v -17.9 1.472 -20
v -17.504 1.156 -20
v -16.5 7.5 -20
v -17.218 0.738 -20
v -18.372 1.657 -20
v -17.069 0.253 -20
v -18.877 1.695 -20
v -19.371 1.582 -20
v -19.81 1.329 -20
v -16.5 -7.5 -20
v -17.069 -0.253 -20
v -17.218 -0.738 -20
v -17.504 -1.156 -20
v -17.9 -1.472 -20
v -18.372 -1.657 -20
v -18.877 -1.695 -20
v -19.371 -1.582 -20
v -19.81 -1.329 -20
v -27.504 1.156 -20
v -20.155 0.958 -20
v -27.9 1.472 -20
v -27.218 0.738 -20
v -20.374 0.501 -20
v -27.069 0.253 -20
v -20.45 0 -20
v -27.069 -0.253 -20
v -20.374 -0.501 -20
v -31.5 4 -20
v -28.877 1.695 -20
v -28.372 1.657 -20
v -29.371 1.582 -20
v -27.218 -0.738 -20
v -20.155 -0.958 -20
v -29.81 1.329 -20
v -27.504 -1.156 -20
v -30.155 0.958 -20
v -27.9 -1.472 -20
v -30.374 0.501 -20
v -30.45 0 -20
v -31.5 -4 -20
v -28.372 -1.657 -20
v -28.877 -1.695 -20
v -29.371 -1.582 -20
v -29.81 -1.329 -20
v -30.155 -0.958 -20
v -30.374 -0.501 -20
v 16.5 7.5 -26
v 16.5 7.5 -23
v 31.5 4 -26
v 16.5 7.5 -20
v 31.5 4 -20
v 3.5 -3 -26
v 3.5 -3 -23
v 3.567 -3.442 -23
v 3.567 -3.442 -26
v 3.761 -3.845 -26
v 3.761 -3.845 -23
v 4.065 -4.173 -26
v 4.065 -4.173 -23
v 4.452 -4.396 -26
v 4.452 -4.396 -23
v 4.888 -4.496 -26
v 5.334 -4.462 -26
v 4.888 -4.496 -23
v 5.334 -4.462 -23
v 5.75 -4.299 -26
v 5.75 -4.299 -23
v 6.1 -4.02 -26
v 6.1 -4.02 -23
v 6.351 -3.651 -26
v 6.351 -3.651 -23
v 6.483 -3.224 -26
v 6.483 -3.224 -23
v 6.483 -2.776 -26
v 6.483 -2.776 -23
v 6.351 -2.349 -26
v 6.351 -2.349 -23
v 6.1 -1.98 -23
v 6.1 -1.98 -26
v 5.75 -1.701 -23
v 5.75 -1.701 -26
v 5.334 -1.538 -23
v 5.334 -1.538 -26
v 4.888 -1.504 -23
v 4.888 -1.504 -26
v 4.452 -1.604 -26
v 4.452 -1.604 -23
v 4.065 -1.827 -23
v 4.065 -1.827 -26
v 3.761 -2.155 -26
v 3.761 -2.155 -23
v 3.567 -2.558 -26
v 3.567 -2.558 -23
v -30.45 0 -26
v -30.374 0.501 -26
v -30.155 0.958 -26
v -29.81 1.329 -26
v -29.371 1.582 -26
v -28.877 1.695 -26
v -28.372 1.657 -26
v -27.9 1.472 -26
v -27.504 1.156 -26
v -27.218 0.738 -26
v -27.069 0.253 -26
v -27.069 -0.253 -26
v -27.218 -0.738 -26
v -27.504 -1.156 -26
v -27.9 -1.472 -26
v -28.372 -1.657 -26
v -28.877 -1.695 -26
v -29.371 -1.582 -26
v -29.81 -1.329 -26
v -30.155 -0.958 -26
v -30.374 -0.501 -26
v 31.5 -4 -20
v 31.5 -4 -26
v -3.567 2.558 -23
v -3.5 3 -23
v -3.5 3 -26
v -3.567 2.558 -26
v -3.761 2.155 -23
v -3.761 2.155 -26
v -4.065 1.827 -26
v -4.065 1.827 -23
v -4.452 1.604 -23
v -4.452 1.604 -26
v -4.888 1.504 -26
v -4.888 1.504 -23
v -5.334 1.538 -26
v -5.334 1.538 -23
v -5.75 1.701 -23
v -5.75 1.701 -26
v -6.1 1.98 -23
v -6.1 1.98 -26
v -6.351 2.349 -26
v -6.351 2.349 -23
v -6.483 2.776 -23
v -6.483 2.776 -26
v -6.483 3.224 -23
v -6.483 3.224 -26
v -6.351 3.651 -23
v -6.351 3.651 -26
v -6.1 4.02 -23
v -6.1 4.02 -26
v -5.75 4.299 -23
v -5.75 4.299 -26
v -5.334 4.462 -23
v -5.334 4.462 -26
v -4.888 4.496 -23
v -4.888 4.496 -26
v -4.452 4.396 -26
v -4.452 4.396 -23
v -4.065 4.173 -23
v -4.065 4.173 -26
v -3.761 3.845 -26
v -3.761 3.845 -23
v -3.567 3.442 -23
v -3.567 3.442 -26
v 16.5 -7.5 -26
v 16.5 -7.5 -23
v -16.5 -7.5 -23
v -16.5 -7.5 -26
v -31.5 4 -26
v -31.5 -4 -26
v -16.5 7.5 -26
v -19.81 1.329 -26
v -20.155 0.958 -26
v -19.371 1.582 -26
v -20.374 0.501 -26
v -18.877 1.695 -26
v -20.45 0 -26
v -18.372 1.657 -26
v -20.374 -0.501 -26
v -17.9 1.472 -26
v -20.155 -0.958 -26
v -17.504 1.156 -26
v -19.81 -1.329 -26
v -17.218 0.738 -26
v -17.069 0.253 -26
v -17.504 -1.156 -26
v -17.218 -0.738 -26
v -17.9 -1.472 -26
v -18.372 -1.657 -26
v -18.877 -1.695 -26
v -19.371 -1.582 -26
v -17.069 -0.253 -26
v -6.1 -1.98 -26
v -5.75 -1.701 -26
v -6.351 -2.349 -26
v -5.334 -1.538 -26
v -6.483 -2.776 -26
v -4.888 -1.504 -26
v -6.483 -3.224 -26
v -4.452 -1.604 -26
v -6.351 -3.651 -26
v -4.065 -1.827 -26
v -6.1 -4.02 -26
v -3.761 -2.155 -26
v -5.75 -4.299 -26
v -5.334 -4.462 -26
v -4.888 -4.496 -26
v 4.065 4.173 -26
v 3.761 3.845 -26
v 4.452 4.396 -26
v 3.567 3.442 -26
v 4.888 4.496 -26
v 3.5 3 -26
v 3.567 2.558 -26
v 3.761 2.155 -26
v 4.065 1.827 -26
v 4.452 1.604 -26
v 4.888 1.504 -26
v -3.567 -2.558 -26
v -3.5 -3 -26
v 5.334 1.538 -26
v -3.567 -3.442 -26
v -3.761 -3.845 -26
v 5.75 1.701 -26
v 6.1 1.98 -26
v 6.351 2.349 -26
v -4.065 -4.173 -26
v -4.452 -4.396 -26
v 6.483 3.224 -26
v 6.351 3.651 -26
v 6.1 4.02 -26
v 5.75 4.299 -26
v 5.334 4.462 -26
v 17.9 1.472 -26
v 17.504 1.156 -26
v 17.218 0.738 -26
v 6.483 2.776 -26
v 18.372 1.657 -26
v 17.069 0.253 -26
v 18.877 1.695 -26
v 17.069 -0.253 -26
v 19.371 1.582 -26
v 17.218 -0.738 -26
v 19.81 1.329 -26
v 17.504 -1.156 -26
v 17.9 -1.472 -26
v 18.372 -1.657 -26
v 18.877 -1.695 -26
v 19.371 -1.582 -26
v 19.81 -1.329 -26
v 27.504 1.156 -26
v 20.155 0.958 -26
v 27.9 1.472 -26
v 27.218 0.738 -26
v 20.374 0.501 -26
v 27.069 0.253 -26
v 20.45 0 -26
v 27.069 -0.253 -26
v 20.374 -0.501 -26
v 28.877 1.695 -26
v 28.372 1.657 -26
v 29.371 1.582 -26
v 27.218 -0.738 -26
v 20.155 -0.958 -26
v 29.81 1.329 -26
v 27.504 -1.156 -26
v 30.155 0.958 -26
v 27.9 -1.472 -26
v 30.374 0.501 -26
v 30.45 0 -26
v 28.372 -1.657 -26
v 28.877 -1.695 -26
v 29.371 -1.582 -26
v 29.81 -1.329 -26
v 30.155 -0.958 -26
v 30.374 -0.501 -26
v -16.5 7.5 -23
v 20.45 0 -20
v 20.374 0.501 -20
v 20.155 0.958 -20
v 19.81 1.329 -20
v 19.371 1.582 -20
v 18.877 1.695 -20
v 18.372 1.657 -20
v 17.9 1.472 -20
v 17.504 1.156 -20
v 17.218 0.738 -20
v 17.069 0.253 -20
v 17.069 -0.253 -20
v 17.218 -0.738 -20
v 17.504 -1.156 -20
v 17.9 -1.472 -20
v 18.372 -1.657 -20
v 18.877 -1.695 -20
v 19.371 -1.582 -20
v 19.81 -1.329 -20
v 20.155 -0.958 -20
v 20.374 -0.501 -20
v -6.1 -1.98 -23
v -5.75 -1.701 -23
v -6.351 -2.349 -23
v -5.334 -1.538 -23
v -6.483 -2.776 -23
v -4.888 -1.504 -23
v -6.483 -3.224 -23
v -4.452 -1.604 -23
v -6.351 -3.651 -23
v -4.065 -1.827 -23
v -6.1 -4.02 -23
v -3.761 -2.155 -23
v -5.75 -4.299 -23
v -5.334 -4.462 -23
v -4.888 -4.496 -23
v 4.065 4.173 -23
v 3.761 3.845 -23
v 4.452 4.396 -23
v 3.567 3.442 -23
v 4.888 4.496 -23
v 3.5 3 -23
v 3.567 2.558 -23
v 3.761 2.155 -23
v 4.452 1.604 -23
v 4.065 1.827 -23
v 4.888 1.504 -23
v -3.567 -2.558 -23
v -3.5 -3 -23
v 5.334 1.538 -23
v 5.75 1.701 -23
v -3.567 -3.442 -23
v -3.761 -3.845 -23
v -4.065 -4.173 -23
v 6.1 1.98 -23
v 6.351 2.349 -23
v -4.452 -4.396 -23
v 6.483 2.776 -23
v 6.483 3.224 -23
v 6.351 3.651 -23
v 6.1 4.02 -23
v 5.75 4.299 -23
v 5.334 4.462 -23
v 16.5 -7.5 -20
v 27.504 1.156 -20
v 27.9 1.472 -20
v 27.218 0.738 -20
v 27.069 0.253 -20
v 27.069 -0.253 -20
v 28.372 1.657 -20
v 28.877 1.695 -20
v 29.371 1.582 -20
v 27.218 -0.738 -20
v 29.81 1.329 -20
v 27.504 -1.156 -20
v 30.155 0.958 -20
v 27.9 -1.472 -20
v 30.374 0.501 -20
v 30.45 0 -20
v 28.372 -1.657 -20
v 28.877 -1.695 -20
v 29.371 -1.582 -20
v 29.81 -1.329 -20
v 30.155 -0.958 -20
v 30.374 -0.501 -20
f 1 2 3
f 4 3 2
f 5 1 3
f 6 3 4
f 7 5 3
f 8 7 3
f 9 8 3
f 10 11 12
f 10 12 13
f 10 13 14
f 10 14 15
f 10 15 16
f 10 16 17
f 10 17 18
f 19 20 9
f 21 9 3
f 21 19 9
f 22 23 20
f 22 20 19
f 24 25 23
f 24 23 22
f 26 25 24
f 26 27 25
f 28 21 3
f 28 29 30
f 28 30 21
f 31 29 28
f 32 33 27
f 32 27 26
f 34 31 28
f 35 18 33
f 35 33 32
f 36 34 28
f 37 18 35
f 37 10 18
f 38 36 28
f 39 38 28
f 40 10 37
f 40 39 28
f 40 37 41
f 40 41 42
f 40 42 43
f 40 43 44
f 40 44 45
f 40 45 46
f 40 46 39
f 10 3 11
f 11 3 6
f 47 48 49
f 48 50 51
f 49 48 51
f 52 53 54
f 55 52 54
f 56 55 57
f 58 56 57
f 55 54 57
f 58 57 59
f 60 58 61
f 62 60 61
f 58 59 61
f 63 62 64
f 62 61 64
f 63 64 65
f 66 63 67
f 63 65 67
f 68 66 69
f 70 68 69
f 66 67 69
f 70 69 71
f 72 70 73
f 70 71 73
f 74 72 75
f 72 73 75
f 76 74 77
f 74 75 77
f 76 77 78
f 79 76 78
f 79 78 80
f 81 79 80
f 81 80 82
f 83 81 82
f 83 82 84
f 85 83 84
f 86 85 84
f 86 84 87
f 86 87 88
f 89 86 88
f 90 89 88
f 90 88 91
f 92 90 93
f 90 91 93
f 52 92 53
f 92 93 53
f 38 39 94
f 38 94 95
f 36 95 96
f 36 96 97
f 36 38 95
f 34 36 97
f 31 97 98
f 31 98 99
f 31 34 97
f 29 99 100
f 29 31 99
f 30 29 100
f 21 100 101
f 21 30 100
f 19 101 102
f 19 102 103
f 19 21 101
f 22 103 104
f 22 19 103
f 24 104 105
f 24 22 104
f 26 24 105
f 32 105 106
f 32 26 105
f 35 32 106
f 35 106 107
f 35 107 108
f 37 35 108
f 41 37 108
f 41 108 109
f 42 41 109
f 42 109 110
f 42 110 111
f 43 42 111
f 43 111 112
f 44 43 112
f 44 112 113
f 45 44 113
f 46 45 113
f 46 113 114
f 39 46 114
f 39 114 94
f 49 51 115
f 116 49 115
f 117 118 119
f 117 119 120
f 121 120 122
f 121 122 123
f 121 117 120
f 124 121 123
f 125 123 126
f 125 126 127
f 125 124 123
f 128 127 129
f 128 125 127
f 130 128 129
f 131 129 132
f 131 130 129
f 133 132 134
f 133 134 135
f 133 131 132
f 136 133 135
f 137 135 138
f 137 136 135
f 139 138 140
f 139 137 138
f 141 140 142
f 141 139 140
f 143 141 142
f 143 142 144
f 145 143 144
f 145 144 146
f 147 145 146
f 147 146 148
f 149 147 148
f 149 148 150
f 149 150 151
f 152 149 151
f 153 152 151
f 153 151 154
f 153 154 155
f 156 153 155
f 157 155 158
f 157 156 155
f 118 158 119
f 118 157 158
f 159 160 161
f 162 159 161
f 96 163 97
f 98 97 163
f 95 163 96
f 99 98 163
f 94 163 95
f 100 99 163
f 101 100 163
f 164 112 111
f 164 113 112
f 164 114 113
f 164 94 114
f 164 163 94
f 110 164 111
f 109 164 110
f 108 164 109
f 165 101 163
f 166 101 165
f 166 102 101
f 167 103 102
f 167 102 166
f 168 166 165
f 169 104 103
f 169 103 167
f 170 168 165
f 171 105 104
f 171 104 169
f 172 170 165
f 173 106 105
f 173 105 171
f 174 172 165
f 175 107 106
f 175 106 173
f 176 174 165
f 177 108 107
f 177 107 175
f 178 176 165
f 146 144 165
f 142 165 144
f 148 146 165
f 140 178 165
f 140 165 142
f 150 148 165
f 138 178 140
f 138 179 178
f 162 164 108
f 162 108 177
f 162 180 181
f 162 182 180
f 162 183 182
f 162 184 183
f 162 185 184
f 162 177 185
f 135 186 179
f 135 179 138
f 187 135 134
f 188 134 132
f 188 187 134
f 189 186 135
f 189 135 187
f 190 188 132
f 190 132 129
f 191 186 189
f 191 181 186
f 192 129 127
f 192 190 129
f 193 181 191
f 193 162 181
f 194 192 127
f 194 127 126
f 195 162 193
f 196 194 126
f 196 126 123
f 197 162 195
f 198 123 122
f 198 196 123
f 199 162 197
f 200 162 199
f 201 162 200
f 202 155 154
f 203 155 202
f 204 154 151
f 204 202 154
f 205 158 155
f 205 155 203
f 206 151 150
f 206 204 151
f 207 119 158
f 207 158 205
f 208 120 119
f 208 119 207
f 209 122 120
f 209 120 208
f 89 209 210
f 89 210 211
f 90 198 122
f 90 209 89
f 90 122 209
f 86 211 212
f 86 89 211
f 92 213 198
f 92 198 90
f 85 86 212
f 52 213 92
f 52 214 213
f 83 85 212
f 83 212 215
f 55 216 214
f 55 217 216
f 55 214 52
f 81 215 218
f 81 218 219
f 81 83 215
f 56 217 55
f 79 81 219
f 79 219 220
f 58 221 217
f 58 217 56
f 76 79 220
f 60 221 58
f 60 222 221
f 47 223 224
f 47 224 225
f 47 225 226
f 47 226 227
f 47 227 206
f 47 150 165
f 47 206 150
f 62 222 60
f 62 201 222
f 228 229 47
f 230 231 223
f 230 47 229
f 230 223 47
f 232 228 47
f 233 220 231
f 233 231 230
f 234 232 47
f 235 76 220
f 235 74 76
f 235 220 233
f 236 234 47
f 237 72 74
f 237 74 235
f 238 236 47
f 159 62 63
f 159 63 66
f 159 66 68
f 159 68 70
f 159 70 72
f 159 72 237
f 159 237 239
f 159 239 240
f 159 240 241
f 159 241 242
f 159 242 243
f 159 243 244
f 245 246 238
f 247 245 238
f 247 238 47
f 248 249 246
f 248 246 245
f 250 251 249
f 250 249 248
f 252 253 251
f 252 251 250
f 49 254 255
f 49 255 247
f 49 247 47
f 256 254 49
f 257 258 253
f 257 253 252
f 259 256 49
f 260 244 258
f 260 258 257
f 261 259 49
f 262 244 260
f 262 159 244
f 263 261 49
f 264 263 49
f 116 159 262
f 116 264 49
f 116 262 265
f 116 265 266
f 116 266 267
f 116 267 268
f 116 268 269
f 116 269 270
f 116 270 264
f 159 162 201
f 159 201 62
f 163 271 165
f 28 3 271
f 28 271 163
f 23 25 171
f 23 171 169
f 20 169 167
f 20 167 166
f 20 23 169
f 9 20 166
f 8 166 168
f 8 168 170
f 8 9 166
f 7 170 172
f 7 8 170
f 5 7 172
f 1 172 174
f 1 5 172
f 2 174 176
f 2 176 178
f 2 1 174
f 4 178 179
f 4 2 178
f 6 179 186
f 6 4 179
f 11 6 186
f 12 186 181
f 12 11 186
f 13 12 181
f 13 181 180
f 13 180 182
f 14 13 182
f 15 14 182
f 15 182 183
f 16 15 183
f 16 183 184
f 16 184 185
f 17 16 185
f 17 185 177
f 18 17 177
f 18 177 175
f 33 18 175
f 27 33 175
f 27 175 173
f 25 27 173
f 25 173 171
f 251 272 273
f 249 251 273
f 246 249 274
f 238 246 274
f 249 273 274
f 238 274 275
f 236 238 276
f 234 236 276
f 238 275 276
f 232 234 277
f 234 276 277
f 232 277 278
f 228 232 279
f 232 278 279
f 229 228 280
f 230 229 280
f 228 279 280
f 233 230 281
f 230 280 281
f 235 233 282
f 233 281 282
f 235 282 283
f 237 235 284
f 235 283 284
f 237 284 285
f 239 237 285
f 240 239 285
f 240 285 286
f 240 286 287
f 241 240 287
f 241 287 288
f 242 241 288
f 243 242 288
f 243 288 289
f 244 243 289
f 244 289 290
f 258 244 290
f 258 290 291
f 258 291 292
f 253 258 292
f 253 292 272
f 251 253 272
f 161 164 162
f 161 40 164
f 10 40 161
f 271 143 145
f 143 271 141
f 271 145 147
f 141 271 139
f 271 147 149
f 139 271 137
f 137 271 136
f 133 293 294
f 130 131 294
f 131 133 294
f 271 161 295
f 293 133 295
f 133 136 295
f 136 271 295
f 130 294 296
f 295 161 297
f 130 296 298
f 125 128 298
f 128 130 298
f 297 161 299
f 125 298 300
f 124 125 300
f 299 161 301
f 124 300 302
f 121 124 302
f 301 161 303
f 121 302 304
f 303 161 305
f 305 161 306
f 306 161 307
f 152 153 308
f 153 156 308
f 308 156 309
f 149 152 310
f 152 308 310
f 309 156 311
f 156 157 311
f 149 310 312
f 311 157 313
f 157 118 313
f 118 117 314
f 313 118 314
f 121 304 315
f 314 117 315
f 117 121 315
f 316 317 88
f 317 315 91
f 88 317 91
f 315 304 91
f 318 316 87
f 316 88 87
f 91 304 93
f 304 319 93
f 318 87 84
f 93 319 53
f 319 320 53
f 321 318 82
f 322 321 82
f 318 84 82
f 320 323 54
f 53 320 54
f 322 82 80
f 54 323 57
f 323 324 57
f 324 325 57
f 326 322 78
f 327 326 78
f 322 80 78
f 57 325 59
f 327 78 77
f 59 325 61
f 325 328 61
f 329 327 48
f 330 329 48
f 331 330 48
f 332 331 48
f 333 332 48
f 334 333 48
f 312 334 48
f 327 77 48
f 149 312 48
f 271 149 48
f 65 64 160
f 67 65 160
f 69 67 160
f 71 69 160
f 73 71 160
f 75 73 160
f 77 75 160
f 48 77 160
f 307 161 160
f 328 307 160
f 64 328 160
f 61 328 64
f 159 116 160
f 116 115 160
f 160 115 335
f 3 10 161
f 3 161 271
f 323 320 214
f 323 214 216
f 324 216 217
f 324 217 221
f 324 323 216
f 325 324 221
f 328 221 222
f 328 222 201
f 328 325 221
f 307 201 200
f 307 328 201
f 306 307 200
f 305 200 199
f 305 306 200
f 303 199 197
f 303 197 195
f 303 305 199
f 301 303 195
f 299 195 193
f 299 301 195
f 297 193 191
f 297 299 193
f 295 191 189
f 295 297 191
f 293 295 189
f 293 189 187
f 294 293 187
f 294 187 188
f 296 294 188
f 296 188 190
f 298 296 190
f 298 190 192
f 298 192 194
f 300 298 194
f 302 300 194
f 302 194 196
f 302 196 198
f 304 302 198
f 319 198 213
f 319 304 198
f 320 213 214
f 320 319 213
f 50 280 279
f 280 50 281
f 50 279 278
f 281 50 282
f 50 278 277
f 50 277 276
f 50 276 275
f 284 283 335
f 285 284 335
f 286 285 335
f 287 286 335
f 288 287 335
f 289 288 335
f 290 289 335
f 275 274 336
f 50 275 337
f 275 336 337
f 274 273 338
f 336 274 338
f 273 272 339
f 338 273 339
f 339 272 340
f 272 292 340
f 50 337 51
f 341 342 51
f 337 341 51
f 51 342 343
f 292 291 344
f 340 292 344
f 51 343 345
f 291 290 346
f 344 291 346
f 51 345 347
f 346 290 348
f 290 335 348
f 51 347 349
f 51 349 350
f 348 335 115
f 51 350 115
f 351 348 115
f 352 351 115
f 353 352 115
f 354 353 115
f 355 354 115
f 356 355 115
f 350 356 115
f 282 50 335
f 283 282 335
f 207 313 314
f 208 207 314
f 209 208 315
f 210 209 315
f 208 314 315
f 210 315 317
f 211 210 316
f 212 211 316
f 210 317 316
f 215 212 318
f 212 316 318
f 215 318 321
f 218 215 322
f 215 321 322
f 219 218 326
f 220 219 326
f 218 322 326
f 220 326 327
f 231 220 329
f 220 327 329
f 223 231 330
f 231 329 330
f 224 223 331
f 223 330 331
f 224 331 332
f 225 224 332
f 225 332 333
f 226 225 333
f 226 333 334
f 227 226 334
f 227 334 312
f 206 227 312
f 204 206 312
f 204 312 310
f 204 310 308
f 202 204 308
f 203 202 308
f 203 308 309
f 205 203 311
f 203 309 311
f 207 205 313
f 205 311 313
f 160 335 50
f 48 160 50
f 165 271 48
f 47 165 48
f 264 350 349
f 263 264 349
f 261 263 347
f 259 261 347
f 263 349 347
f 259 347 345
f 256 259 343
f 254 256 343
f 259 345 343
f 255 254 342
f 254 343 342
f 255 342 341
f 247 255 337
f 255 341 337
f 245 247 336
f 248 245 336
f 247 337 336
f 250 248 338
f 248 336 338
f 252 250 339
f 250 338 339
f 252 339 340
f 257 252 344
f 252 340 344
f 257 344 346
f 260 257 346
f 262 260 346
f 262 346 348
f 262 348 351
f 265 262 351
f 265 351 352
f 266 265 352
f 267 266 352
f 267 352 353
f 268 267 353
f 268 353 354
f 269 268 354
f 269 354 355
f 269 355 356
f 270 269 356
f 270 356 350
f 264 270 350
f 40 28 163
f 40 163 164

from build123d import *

# Parameters (mm, degrees)
SKETCH068_R  = 1.7
PAD050_DEPTH = 100
SKETCH067_R  = 1.5
PAD049_DEPTH = 3
PAD048_DEPTH = 3


with BuildPart() as mountscrewcutouts:
    # Sketch068 → Pad050 (new body)
    with BuildSketch(Plane.XY):
        with Locations((28.75, 0)):
            Circle(SKETCH068_R)
        with Locations((18.75, 0)):
            Circle(SKETCH068_R)
    extrude(amount=-PAD050_DEPTH)


with BuildPart() as baseplate:
    # Sketch067 → Pad049 (new body)
    with BuildSketch(Plane(origin=(0, 0, -23), x_dir=(-1, 0, 0), z_dir=(0, 0, 1))):
        Polygon((-31.5, -4), (-31.5, 4), (-16.5, 7.5), (0, 7.5), (0, -7.5), (-16.5, -7.5), align=None)
        with Locations((-5, 3)):
            Circle(SKETCH067_R, mode=Mode.SUBTRACT)
        with Locations((-5, -3)):
            Circle(SKETCH067_R, mode=Mode.SUBTRACT)
    extrude(amount=-PAD049_DEPTH)


with BuildPart() as supportplate:
    # Sketch066 → Pad048 (new body)
    with BuildSketch(Plane(origin=(0, 0, -20), x_dir=(-1, 0, 0), z_dir=(0, 0, 1))):
        Polygon((-31.5, -4), (-31.5, 4), (-16.5, 7.5), (-16.5, -7.5), align=None)
    extrude(amount=-PAD048_DEPTH)

    # Fusion004017: union BasePlate
    add(baseplate.part)

    # Cut007017: cut MountScrewCutouts
    add(mountscrewcutouts.part, mode=Mode.SUBTRACT)


with BuildPart() as fusion004018:
    # Part__Mirroring001: instance of SupportPlate
    add(supportplate.part.mirror(Plane(origin=(0, 0, 0), x_dir=(0, -1, 0), z_dir=(1, 0, 0))))

    # Fusion004018: union SupportPlate
    add(supportplate.part)


solid = fusion004018.part
